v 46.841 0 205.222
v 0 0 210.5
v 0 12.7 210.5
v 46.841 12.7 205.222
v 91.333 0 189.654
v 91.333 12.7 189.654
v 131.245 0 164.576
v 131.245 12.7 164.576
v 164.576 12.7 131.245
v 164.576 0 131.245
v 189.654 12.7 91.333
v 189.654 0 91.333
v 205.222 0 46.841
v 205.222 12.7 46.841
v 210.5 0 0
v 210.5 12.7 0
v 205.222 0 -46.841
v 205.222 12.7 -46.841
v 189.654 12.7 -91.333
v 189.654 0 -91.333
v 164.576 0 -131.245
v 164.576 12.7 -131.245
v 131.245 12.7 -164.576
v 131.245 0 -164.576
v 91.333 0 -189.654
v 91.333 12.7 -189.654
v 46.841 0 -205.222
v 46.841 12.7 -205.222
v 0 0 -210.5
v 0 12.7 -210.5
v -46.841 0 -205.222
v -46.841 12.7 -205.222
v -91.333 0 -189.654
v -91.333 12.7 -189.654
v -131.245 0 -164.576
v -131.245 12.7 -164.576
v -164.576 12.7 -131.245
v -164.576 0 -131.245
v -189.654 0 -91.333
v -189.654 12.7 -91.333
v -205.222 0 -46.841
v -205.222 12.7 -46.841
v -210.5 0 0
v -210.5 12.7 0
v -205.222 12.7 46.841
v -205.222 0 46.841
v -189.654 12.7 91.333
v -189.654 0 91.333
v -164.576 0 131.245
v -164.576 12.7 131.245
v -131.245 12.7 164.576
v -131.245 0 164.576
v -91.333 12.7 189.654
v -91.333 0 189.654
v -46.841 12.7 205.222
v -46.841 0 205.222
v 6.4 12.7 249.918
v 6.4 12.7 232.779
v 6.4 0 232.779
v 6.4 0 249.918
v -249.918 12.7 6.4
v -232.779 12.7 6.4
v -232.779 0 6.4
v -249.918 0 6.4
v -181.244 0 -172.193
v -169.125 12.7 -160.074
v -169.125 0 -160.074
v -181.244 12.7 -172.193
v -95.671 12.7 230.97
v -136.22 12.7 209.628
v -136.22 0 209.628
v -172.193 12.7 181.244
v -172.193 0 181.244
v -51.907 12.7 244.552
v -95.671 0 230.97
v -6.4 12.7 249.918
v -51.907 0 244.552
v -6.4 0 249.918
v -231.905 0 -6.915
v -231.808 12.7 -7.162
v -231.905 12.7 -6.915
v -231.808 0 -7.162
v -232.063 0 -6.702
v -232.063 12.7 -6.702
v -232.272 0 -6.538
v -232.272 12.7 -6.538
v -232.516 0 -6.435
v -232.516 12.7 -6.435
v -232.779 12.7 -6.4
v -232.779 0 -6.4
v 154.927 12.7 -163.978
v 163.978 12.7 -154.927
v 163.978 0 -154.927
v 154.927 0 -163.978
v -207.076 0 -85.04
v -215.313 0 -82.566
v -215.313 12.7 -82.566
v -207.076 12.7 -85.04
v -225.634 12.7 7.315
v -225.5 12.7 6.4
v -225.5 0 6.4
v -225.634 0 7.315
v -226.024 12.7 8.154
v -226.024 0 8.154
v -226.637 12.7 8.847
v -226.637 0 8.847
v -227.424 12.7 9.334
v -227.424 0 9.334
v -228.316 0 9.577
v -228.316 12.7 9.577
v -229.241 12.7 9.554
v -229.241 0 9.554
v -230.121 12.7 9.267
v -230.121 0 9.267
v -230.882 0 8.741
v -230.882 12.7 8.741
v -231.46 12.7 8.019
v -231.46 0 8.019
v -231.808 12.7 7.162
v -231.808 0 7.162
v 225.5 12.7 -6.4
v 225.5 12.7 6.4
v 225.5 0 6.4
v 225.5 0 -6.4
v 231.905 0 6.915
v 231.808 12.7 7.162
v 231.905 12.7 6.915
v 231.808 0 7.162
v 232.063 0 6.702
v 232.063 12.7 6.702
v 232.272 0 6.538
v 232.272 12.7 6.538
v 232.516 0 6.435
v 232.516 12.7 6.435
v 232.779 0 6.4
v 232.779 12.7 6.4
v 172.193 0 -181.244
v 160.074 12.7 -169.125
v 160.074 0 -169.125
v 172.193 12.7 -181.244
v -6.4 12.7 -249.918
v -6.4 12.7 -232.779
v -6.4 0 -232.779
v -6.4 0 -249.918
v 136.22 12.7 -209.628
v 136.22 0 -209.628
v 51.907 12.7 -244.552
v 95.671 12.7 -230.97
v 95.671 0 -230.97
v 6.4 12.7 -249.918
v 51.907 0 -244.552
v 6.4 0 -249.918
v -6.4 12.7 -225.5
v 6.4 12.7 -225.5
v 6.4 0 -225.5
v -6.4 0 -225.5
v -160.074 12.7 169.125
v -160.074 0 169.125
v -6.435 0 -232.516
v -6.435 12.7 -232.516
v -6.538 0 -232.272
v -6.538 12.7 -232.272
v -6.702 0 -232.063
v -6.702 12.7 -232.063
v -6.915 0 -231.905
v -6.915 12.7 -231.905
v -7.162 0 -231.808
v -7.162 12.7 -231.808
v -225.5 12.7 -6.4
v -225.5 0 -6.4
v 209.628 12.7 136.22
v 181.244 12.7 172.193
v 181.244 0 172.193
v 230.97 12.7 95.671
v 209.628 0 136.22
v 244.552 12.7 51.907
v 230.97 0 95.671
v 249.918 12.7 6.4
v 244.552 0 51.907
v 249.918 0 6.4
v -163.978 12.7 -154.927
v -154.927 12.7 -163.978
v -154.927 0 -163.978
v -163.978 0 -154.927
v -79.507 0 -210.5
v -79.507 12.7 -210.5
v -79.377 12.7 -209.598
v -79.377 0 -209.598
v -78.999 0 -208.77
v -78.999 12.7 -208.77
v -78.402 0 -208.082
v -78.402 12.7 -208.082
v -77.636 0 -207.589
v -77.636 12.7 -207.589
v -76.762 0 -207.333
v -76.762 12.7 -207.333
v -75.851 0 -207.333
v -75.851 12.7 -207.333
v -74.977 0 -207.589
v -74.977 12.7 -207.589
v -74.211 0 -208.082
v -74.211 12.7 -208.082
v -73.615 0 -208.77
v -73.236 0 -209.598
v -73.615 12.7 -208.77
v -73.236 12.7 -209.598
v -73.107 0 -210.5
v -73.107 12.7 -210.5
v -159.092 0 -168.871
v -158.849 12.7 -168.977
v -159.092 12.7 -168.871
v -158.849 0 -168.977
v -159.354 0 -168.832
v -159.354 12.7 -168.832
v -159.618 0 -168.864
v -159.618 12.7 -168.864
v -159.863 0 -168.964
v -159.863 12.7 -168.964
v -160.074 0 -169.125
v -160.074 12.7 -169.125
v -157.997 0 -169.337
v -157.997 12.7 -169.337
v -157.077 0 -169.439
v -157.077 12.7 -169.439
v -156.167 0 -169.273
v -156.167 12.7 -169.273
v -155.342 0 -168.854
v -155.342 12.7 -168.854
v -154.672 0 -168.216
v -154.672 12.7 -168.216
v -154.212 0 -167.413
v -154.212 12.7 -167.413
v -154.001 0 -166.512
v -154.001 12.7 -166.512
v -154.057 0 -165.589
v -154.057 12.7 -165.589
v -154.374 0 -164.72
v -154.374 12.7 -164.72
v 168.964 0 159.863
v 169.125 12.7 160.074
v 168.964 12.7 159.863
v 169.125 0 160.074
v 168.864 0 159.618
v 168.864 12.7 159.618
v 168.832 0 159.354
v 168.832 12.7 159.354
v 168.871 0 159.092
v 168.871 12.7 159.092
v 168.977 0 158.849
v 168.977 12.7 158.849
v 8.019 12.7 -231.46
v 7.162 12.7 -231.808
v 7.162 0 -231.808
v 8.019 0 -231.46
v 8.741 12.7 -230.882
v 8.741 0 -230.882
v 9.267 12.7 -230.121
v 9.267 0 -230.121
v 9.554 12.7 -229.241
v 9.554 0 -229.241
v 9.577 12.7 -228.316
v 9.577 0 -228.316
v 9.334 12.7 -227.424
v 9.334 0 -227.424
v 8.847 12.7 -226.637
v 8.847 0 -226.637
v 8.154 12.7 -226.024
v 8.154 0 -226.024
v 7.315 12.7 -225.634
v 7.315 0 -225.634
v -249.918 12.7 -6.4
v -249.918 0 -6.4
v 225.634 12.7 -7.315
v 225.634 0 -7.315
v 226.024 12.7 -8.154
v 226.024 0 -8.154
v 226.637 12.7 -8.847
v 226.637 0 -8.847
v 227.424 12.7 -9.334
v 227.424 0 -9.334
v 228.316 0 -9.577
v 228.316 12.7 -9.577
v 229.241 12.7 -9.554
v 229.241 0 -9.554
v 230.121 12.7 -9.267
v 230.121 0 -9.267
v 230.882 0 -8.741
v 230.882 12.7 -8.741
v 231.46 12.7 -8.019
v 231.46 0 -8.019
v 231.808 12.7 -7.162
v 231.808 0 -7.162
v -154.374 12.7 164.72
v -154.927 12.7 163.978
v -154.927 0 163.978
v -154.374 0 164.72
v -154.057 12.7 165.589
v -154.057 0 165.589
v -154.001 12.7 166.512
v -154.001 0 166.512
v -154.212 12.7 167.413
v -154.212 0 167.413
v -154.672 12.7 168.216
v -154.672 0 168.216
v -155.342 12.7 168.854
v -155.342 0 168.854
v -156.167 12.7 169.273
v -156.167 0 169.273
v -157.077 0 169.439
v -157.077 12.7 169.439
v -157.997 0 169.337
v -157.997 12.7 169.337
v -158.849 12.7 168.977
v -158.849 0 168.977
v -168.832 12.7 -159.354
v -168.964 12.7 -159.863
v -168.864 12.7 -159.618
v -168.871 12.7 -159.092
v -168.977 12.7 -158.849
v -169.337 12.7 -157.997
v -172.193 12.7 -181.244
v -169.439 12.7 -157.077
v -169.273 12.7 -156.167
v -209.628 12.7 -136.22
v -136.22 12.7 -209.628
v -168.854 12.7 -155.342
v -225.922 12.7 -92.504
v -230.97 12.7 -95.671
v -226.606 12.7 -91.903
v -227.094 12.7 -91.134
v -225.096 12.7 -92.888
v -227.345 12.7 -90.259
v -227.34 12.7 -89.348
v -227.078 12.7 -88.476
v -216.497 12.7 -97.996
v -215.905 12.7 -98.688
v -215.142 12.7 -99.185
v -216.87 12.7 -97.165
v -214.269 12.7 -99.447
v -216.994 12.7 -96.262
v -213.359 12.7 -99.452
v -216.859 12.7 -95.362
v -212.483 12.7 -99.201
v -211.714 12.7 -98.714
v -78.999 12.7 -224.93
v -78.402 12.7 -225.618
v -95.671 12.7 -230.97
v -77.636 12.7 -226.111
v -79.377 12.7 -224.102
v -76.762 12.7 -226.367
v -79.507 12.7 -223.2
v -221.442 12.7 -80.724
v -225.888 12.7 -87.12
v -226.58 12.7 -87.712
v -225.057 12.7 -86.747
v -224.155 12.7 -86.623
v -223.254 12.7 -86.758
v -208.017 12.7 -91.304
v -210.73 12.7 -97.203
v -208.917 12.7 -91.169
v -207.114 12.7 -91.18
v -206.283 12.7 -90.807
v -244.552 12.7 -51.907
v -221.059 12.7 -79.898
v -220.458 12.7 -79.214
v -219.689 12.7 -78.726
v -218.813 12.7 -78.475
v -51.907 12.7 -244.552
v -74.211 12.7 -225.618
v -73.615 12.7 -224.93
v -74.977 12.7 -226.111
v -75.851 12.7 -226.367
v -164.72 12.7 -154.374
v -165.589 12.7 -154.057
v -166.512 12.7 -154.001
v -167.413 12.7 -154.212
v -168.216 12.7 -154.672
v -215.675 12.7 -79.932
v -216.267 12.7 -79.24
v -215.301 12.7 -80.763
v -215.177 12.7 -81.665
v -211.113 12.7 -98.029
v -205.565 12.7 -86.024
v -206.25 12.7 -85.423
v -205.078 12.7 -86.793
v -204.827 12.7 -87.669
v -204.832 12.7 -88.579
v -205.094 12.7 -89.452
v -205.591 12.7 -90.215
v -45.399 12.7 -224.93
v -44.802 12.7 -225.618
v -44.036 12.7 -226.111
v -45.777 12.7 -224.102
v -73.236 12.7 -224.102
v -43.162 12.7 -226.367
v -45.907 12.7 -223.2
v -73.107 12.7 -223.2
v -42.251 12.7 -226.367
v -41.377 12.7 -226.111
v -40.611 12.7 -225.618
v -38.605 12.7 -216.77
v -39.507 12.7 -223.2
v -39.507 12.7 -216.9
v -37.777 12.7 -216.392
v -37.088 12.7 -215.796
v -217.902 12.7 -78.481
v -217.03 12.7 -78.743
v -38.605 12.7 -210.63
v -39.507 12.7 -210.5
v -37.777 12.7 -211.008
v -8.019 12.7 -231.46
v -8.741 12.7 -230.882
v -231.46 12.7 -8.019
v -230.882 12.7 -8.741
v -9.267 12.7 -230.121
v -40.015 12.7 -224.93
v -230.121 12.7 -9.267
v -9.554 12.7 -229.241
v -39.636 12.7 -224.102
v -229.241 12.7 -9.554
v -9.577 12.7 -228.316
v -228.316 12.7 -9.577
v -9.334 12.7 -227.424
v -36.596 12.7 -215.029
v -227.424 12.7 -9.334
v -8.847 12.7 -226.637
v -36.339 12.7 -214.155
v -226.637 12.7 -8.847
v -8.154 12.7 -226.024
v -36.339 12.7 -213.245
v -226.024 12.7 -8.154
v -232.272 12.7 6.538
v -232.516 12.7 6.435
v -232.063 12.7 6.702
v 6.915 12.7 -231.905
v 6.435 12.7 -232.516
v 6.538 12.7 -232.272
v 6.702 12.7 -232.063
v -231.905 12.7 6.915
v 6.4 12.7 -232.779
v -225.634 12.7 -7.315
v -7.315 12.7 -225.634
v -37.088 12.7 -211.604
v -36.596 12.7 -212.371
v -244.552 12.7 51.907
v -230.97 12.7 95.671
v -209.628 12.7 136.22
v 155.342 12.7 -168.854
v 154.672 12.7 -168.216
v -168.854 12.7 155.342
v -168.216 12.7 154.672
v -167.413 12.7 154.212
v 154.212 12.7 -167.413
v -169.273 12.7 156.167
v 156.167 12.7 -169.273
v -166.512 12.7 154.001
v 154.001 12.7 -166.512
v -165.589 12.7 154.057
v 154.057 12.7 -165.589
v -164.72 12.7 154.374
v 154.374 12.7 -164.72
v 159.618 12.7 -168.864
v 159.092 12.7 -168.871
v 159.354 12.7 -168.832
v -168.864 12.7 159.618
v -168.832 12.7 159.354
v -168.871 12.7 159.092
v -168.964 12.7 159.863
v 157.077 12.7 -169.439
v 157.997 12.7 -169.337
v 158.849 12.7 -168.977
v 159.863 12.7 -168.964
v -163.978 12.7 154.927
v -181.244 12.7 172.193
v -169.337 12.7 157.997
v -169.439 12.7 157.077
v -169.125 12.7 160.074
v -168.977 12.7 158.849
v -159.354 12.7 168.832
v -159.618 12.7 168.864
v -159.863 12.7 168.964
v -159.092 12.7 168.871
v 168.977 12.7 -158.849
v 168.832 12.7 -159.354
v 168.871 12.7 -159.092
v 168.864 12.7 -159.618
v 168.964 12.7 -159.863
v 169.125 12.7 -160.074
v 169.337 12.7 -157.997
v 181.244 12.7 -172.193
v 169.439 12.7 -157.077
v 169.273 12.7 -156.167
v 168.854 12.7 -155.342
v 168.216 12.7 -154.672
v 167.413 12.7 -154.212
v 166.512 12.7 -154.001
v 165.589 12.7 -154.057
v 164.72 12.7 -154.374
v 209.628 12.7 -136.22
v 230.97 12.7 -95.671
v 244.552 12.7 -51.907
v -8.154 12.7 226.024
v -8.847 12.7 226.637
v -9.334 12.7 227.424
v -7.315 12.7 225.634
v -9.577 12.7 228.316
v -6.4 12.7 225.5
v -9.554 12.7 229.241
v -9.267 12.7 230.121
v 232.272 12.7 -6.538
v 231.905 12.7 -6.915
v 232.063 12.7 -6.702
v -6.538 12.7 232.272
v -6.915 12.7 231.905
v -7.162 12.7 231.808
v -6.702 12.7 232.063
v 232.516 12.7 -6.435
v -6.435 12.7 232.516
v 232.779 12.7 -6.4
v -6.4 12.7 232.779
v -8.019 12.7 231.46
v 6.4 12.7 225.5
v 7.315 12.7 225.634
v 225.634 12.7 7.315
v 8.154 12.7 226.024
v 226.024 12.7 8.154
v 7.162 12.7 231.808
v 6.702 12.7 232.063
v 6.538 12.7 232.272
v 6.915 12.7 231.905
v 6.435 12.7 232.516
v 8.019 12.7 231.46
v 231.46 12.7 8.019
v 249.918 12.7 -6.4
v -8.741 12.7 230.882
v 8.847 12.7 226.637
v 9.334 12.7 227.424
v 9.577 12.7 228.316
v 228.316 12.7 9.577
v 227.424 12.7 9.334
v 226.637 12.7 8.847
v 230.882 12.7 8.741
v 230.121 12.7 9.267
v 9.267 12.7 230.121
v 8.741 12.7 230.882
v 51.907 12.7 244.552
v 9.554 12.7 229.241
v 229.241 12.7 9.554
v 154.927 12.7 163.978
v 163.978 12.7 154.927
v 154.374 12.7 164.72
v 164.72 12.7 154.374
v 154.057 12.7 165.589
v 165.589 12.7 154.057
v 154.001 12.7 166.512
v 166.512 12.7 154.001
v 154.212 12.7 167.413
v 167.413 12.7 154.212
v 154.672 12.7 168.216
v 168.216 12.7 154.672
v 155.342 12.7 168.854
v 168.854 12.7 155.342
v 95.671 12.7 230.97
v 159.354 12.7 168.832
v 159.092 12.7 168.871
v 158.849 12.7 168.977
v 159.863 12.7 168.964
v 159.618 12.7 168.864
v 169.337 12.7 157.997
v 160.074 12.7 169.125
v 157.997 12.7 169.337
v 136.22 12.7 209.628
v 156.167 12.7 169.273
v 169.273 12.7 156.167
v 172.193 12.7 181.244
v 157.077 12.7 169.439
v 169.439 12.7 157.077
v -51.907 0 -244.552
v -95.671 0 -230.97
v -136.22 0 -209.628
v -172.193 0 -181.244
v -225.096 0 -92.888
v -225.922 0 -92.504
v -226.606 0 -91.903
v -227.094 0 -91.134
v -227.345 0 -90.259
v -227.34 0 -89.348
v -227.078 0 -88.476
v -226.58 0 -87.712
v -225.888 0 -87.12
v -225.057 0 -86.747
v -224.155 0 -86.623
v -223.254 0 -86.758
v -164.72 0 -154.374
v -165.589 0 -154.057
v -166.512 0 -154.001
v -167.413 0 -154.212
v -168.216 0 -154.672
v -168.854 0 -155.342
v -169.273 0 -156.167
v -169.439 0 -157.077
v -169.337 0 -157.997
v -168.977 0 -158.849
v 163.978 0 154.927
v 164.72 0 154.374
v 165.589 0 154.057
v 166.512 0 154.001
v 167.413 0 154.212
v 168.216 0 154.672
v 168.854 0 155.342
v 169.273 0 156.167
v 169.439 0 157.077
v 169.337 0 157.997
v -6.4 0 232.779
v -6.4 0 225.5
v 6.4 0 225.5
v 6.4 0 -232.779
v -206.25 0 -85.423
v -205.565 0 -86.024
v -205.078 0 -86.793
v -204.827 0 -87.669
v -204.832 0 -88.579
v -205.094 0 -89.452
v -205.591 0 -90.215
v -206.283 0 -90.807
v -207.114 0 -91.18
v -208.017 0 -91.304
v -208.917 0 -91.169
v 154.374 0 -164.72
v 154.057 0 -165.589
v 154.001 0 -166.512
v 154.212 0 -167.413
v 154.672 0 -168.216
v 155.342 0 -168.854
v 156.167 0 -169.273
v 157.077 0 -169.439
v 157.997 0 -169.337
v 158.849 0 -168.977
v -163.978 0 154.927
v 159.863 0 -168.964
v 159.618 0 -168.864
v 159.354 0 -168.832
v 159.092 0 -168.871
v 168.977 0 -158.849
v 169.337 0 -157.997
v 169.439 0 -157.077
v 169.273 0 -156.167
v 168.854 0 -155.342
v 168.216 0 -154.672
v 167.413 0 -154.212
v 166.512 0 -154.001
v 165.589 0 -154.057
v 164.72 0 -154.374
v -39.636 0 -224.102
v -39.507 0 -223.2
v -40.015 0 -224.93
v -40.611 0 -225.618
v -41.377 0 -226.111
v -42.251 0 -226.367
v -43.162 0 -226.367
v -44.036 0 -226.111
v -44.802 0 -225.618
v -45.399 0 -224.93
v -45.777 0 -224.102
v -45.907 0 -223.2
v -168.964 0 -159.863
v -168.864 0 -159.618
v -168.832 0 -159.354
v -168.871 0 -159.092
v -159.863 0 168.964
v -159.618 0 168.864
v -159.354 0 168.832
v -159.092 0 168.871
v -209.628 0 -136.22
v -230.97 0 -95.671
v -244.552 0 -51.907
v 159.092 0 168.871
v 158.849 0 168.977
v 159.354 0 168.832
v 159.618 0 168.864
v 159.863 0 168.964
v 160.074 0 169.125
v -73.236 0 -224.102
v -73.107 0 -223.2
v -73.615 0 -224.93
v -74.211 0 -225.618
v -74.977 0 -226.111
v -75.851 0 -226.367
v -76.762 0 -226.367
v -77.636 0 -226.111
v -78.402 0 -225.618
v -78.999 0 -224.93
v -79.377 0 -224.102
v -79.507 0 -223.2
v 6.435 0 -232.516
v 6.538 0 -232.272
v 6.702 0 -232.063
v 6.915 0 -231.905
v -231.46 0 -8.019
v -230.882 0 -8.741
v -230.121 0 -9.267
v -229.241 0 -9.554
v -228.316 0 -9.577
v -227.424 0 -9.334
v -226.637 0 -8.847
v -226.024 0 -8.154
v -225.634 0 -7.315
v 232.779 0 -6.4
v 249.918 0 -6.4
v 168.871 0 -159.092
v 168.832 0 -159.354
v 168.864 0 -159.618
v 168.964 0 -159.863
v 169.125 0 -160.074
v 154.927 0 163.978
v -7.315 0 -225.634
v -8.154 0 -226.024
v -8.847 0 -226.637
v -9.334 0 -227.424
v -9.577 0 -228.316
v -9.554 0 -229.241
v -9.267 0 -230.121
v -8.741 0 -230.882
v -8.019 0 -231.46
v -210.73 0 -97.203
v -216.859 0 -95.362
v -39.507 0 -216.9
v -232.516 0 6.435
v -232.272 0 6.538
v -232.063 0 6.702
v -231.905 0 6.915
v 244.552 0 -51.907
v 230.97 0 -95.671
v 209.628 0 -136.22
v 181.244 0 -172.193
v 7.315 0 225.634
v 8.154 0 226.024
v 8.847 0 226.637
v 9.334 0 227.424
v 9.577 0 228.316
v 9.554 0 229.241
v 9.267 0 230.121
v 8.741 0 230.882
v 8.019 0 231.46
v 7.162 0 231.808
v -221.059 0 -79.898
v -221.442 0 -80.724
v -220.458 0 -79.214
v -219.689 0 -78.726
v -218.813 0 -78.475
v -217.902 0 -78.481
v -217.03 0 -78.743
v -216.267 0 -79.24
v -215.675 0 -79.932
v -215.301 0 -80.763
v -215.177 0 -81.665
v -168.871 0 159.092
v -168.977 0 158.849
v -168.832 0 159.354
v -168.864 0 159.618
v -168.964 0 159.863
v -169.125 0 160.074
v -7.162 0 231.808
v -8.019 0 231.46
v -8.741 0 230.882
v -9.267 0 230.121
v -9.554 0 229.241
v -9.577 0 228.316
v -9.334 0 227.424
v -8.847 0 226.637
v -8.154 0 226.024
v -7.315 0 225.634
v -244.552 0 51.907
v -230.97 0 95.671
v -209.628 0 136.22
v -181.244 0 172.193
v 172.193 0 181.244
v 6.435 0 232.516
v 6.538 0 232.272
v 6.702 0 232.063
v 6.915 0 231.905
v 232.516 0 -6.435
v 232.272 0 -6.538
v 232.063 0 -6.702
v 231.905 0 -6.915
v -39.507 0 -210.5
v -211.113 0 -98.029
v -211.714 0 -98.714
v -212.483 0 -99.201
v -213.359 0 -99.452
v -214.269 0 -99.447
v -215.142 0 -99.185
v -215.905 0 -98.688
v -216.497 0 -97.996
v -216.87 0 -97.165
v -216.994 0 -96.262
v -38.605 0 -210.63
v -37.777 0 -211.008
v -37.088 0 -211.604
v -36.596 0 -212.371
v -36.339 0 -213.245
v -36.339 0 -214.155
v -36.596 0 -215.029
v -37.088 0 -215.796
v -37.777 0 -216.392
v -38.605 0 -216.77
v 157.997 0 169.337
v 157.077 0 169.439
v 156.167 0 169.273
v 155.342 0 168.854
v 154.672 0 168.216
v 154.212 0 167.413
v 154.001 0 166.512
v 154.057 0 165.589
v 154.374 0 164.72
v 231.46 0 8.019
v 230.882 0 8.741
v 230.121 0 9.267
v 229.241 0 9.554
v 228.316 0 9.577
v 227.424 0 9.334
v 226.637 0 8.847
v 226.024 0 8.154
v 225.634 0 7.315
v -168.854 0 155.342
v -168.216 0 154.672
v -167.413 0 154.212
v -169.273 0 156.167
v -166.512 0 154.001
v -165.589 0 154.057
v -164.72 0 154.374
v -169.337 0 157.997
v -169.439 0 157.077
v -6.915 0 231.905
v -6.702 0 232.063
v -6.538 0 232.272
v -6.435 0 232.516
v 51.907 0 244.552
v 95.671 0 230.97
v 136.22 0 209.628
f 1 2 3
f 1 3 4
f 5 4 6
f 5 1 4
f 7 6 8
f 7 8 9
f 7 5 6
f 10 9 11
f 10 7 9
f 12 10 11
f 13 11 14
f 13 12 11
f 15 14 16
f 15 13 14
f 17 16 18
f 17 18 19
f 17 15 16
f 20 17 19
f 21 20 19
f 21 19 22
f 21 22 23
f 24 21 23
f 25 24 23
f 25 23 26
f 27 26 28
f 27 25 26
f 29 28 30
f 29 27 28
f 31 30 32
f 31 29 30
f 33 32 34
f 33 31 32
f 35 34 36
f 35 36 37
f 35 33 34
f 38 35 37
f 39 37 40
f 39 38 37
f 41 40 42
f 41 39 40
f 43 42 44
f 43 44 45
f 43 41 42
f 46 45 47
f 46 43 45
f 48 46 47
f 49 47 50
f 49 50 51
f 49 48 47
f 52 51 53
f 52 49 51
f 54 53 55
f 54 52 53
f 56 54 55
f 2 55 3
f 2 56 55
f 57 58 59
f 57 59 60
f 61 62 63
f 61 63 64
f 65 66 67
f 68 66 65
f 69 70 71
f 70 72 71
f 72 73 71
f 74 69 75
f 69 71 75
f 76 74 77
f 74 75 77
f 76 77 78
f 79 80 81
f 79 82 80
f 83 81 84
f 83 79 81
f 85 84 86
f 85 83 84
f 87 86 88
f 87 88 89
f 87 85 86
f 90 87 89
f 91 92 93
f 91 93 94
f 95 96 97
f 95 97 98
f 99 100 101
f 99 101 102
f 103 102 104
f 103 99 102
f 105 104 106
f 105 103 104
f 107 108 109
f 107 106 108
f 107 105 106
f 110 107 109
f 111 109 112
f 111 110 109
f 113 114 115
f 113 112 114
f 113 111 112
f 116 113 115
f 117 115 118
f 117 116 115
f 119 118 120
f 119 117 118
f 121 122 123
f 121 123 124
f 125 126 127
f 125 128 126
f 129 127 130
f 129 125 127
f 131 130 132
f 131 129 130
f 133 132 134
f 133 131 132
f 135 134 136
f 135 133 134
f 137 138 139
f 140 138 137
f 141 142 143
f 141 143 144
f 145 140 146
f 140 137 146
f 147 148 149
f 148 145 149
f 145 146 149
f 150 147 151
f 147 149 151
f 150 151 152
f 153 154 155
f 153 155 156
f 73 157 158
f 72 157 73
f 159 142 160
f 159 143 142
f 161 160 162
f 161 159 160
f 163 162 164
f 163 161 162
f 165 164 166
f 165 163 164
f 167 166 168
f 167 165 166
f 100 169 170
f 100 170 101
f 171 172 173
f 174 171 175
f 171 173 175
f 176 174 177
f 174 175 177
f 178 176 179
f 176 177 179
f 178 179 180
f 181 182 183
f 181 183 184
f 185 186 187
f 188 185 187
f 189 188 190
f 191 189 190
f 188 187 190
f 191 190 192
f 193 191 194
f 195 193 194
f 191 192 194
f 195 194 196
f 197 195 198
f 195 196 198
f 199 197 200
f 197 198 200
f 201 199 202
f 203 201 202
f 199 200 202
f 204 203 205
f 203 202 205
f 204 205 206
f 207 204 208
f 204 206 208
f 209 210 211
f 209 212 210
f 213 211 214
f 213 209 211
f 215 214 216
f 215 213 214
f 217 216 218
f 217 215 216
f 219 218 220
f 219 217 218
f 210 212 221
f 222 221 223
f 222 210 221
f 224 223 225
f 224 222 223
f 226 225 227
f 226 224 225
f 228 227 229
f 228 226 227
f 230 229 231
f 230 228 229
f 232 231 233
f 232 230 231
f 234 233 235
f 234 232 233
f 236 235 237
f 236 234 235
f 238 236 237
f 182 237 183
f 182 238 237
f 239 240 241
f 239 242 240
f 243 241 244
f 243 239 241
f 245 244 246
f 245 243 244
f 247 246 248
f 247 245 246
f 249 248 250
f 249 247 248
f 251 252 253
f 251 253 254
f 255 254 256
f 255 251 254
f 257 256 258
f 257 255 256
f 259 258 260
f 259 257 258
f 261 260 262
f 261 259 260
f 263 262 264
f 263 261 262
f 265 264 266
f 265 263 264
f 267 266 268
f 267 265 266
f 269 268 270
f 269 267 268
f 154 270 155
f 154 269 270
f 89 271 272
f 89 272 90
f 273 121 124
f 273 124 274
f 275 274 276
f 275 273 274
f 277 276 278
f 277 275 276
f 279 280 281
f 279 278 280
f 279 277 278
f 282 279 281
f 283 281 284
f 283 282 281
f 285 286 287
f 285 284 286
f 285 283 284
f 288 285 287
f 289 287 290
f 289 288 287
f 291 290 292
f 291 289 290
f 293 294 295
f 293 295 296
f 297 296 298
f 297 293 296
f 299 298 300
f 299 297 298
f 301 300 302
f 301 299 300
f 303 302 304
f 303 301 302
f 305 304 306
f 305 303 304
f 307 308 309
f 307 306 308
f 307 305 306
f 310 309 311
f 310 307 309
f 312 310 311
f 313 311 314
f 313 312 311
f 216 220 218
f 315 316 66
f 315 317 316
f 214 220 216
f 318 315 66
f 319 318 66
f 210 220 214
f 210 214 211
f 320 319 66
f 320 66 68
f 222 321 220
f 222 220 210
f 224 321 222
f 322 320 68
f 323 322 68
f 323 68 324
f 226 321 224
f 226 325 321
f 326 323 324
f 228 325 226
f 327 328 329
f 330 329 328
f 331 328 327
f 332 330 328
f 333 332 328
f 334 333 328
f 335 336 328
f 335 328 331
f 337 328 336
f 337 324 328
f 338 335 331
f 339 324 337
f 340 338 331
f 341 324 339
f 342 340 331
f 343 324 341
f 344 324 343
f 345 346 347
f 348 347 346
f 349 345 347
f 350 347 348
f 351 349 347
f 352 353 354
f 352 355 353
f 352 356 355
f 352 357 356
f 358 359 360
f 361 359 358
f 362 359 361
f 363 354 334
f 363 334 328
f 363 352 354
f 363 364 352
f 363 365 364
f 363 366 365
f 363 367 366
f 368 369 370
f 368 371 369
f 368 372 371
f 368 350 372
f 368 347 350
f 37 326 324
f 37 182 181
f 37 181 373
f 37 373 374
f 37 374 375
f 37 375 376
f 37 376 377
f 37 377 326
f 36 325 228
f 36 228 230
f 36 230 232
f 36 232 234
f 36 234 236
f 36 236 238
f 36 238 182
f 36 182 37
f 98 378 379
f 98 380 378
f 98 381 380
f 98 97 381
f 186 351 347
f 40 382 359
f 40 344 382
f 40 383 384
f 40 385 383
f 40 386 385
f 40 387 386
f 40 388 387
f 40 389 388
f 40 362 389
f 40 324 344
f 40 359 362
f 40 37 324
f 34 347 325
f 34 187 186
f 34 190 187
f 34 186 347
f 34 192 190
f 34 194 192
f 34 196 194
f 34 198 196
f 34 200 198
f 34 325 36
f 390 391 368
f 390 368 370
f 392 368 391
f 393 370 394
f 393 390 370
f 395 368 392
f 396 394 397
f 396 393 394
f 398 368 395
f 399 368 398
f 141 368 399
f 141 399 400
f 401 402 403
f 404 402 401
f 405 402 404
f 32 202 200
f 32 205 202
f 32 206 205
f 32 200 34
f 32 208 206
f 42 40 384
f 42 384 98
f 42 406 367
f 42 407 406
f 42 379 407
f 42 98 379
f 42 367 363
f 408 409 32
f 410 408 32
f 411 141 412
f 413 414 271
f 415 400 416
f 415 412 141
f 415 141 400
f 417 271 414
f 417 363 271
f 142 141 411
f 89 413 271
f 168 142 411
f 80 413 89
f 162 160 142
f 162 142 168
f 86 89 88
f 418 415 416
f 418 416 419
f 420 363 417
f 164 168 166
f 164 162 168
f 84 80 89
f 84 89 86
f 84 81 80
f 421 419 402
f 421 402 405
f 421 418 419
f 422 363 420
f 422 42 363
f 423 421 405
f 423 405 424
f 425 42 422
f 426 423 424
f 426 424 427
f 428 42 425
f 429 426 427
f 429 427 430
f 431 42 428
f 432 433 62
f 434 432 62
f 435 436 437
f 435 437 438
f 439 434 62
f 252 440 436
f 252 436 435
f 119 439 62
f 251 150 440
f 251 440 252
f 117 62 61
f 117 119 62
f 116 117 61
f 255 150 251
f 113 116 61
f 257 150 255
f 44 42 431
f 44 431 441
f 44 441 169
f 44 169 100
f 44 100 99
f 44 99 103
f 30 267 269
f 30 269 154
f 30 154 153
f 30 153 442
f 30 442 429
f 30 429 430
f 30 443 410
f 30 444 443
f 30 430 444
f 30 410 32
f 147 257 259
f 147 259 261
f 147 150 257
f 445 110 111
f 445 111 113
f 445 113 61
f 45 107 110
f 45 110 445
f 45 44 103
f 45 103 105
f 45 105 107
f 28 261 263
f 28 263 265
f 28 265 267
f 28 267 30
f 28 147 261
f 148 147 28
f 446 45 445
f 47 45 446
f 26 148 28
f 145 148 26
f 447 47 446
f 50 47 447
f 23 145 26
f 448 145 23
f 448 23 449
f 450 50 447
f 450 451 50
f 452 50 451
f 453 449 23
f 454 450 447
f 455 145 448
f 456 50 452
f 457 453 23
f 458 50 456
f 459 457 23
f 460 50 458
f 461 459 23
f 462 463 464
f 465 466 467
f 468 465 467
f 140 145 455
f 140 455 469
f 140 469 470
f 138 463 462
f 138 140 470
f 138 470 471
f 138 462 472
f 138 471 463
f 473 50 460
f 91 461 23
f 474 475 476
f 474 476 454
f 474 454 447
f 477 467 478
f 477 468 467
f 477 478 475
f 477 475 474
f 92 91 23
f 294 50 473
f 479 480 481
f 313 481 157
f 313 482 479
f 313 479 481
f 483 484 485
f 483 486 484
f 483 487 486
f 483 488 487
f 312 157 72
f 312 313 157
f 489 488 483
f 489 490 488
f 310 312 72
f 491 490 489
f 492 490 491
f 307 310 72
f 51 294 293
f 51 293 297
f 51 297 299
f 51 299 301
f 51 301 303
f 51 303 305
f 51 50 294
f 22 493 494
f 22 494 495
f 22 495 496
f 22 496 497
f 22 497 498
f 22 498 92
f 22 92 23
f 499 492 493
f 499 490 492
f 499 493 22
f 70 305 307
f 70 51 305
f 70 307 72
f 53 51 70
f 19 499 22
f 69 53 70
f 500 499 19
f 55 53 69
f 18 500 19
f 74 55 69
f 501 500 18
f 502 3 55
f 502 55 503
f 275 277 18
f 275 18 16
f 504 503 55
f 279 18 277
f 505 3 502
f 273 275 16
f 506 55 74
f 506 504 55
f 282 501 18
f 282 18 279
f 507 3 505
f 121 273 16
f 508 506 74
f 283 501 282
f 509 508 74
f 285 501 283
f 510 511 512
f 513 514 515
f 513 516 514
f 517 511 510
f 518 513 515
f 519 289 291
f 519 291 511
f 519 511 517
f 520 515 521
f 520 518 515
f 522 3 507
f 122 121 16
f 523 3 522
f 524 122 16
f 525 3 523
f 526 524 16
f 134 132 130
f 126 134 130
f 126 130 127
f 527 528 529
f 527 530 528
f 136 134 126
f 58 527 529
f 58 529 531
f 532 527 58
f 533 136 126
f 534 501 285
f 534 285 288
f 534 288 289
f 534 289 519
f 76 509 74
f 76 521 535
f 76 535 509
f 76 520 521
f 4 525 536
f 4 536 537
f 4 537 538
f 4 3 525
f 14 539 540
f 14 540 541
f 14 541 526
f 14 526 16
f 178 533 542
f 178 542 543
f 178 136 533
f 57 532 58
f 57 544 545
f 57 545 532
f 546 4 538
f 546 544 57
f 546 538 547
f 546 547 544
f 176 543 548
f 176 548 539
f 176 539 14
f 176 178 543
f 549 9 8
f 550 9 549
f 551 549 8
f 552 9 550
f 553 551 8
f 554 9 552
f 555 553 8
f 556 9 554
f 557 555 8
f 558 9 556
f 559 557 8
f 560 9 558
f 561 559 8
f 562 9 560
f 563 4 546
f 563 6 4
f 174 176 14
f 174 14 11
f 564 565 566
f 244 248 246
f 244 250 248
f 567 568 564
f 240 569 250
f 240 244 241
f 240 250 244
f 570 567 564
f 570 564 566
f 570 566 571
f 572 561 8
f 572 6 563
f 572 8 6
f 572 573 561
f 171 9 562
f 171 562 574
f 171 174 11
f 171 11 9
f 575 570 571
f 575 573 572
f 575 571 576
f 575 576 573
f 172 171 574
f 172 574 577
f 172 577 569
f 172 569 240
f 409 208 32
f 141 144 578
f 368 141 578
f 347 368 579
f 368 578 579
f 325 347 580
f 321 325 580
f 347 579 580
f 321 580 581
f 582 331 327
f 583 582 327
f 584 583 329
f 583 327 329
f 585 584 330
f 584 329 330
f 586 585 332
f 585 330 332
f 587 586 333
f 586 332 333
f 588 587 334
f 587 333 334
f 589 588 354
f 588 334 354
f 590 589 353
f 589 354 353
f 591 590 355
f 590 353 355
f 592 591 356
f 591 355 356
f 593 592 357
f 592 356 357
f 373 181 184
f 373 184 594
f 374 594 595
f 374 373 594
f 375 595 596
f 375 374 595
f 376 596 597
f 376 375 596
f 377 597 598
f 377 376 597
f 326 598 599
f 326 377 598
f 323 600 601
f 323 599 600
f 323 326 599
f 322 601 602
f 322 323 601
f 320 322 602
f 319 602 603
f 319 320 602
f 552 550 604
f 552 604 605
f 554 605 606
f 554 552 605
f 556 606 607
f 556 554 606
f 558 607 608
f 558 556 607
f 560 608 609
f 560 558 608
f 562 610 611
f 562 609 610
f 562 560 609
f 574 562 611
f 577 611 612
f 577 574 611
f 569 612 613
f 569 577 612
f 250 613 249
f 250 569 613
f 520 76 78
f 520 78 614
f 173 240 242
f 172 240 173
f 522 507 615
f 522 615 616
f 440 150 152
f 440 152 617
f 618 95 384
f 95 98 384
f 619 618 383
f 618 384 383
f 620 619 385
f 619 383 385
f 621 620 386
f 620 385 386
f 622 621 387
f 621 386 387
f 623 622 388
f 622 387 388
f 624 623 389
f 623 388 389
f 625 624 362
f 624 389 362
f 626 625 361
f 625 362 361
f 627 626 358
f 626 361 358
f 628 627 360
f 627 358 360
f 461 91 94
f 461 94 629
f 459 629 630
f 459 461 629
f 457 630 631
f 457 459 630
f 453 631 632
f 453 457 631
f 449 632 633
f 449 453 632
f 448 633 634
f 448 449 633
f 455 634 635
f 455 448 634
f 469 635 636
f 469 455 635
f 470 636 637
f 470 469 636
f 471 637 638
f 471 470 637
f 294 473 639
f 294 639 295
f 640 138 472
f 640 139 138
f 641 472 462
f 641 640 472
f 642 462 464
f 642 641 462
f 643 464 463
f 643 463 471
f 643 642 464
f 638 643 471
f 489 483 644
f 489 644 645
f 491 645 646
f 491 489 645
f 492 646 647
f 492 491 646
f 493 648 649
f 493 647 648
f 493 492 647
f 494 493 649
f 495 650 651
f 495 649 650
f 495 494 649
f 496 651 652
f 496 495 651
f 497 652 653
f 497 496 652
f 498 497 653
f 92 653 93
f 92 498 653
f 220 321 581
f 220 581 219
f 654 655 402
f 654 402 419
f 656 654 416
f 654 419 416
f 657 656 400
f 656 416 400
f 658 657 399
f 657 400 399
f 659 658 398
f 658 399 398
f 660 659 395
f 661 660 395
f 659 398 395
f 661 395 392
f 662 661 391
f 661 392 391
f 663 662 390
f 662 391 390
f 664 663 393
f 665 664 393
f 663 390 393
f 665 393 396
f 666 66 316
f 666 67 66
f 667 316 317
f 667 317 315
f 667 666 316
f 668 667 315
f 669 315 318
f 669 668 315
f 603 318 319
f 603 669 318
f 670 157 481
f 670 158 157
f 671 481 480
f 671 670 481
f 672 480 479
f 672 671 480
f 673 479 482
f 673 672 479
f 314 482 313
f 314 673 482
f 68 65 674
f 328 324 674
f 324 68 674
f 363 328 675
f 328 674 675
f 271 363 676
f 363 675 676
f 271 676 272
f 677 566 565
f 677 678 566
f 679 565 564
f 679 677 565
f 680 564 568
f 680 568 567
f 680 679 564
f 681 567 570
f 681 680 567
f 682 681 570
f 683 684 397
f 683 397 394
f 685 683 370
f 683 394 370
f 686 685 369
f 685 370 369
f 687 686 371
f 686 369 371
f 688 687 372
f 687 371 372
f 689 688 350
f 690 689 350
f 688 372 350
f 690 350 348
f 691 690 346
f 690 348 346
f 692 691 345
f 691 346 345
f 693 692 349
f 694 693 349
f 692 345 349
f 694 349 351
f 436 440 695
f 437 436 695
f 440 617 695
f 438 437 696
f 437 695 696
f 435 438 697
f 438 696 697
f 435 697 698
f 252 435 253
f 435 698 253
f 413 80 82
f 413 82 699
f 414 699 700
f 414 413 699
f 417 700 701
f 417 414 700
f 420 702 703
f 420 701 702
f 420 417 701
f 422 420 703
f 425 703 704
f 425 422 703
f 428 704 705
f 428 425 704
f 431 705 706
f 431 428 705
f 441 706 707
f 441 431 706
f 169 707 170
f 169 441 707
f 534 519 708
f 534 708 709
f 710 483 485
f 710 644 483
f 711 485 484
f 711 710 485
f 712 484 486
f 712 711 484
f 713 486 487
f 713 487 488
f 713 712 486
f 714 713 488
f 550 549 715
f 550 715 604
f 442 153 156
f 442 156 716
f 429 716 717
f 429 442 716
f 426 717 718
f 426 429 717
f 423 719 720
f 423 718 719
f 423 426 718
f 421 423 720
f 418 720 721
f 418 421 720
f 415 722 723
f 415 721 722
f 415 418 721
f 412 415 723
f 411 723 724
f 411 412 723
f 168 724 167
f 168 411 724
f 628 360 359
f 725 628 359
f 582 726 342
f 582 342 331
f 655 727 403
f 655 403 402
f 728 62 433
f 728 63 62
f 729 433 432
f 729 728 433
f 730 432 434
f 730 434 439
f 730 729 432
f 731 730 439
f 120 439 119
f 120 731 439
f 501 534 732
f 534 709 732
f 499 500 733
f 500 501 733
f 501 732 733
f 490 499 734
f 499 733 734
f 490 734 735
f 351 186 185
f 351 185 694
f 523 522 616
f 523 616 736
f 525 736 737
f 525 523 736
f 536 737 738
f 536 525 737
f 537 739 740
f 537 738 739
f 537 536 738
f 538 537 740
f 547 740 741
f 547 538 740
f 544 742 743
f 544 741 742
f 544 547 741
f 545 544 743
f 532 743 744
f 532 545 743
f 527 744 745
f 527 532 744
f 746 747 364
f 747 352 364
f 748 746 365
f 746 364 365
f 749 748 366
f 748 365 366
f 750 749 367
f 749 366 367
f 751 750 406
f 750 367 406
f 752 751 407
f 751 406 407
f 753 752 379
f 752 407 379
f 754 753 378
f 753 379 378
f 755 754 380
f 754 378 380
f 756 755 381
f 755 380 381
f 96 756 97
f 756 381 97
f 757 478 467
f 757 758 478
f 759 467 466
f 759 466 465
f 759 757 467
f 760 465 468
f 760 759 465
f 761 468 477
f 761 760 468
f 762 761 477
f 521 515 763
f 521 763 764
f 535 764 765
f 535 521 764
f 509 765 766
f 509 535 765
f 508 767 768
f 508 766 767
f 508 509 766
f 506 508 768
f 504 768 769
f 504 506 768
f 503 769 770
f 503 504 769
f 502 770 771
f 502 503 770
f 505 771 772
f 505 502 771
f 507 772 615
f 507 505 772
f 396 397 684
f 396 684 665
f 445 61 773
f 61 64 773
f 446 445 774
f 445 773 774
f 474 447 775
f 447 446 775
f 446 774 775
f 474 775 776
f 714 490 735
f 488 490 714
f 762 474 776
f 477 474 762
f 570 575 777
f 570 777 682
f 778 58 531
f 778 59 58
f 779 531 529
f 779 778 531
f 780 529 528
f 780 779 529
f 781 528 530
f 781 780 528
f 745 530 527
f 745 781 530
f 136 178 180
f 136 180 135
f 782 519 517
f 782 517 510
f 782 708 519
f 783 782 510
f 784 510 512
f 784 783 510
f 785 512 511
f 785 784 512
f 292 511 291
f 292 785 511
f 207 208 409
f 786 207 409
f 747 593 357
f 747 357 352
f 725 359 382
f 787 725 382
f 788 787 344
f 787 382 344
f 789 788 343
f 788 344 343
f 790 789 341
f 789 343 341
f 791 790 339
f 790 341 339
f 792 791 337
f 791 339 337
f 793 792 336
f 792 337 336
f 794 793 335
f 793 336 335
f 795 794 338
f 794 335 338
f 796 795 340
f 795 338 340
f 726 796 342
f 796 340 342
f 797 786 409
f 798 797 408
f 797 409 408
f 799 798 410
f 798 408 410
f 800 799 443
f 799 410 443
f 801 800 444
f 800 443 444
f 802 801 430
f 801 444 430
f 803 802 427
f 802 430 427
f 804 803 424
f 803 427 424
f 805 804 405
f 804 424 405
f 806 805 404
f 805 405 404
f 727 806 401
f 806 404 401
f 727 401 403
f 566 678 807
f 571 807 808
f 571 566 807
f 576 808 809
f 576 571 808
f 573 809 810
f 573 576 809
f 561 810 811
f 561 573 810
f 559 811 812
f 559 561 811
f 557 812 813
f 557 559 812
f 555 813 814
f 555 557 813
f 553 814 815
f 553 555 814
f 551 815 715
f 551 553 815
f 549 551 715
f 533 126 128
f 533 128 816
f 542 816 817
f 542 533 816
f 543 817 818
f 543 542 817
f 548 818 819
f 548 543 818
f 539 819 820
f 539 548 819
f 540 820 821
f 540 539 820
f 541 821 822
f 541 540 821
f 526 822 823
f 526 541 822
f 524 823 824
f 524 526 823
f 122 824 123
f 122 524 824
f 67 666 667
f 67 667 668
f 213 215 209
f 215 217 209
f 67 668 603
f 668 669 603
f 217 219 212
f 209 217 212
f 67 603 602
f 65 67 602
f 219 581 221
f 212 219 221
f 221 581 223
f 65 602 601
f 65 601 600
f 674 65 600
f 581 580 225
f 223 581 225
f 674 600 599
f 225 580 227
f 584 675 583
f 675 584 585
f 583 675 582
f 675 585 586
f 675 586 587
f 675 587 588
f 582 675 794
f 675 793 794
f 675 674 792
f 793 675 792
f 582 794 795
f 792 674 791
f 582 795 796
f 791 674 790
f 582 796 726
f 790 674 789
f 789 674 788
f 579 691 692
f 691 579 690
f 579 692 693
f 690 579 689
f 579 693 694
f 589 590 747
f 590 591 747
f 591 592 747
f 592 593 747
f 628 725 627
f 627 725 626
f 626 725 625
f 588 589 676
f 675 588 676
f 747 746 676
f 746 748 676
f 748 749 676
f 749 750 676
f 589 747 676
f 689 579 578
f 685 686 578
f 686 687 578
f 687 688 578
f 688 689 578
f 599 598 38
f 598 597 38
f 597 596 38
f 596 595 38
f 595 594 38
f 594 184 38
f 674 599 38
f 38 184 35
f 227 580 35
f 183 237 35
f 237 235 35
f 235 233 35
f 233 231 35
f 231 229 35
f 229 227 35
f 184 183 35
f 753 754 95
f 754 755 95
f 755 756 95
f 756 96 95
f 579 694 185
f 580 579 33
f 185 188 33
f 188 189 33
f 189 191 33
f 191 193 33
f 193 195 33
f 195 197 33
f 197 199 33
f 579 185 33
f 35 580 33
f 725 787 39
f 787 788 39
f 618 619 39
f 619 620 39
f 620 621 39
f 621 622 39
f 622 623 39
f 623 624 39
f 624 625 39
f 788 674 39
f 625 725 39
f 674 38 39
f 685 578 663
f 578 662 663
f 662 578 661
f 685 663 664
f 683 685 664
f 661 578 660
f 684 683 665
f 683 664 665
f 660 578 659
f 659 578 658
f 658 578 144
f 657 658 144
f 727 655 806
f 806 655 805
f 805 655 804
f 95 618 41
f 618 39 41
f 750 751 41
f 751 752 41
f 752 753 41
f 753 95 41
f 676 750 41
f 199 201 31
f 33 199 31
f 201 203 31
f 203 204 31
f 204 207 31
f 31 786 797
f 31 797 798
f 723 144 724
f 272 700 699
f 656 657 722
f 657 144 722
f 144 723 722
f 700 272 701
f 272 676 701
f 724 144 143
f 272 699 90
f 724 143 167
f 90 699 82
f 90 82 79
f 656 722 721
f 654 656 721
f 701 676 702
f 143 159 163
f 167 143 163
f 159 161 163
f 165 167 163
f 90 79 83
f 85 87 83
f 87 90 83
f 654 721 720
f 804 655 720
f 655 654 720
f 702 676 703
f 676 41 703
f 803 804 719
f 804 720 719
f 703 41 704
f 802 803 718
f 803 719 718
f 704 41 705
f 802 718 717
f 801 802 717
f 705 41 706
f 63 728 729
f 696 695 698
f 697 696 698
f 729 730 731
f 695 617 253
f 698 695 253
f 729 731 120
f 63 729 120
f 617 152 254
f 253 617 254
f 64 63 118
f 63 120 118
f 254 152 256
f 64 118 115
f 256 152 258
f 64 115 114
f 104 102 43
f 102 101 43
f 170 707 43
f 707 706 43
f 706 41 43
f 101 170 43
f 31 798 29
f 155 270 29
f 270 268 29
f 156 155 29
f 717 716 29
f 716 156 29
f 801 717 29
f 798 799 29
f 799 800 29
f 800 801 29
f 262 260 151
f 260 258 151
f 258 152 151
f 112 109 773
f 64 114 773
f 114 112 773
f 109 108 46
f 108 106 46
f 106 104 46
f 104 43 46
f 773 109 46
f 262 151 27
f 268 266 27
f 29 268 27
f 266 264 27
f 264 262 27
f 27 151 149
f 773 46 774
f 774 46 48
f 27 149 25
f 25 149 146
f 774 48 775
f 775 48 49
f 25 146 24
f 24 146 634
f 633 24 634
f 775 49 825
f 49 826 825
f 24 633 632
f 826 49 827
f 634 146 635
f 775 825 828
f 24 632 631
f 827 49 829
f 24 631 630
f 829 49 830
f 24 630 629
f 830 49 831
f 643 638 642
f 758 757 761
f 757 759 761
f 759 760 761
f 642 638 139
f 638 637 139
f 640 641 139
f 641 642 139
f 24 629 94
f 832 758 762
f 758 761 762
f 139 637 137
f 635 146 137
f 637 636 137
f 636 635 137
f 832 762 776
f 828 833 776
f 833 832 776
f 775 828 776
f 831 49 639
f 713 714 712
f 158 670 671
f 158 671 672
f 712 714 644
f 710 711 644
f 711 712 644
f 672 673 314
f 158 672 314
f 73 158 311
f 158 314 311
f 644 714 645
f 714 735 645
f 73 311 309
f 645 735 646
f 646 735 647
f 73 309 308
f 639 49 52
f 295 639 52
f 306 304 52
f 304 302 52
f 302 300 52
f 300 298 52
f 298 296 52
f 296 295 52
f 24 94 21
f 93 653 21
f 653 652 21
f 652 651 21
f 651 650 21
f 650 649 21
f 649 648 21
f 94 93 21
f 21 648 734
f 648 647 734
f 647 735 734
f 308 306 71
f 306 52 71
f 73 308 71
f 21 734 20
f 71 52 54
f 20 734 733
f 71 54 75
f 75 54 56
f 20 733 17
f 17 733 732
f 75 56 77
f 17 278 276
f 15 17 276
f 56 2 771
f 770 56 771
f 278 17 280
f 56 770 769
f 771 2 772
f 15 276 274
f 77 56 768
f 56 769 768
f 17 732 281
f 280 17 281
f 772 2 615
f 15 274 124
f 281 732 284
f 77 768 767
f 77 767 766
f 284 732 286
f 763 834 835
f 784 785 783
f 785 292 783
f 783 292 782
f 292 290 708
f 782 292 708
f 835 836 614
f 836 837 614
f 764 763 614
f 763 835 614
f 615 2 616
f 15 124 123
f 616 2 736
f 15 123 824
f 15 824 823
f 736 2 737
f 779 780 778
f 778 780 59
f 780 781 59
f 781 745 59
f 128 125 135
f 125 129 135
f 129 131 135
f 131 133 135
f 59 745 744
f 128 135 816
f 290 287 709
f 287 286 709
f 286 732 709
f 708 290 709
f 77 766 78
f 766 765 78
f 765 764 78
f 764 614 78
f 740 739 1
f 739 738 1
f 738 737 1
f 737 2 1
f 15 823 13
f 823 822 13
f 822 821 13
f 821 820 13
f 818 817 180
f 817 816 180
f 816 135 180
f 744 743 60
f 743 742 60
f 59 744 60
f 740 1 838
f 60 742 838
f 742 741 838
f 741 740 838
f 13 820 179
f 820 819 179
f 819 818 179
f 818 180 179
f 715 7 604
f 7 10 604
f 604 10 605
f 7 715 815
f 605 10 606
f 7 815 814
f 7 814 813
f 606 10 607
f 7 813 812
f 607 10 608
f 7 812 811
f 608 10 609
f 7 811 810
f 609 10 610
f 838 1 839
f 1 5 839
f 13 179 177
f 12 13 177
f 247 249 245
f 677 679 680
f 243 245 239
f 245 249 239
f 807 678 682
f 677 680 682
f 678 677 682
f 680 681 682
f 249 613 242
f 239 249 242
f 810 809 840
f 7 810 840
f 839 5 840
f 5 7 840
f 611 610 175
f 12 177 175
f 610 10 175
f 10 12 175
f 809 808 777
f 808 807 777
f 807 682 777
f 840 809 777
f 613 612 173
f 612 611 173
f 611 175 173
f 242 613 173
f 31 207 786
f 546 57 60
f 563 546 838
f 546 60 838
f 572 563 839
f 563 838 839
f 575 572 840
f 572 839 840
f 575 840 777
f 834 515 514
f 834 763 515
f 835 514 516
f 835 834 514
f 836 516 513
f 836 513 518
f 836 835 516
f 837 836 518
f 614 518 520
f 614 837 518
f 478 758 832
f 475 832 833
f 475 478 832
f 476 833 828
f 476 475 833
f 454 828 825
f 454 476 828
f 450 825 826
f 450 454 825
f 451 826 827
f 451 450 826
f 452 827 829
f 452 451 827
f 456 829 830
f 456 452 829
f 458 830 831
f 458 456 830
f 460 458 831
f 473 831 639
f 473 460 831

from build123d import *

# Parameters (mm, degrees)
SKETCH1_R                = 250
SKETCH1_R_2              = 210.5
BOSS_EXTRUDE1_DEPTH      = 12.7
CUT_EXTRUDE1_DEPTH       = 354.781415566
FILLET1_R                = 1
CIRPATTERN1_COUNT        = 8
FILLET1_OF_CIRPATTERN1_R = 1
SKETCH6_W                = 40
SKETCH6_H                = 12.7
CUT_EXTRUDE4_DEPTH       = 354.665618911
SKETCH7_R                = 3.2
CUT_EXTRUDE5_DEPTH       = 354.665618911


with BuildPart() as part:
    # Sketch1 → Boss-Extrude1 (new body)
    with BuildSketch(Plane(origin=(0, 0, 0), x_dir=(1, 0, 0), z_dir=(0, 1, 0))):
        with Locations(Location((0, 0, 0), (0, 0, 270))):
            Circle(SKETCH1_R)
        with Locations(Location((0, 0, 0), (0, 0, 270))):
            Circle(SKETCH1_R_2, mode=Mode.SUBTRACT)
    extrude(amount=BOSS_EXTRUDE1_DEPTH)

    # Sketch2 → Cut-Extrude1 (cut, through all)
    with BuildSketch(Plane(origin=(0, 12.7, 0), x_dir=(1, 0, 0), z_dir=(0, 1, 0))):
        with BuildLine():
            Line((6.4, 225.5), (-6.4, 225.5))
            ThreePointArc((-6.4, 225.5), (-9.6, 228.7), (-6.4, 231.9))
            Line((-6.4, 231.9), (-6.4, 250))
            Line((-6.4, 250), (6.4, 250))
            Line((6.4, 250), (6.4, 231.9))
            ThreePointArc((6.4, 231.9), (9.6, 228.7), (6.4, 225.5))
        make_face()
    cut_extrude1 = extrude(amount=-CUT_EXTRUDE1_DEPTH, mode=Mode.SUBTRACT)

    # Fillet1
    fillet1_edges = [part.edges().sort_by_distance(p)[0] for p in [
        (-6.4, 6.35, -231.9),
        (6.4, 6.35, -231.9),
    ]]
    fillet(fillet1_edges, radius=FILLET1_R)

    # CirPattern1: Cut-Extrude1 ×8 about axis
    cirpattern1_axis = Axis((0, 0, 0), (0, 1, 0))
    for i in range(1, CIRPATTERN1_COUNT):
        add(cut_extrude1.rotate(cirpattern1_axis, i * 360 / CIRPATTERN1_COUNT), mode=Mode.SUBTRACT)

    # Fillet1 of CirPattern1
    fillet1_of_cirpattern1_edges = [part.edges().sort_by_distance(p)[0] for p in [
        (-168.503545957, 6.35, -159.452579158),
        (-159.452579158, 6.35, -168.503545957),
        (-231.9, 6.35, 6.4),
        (-231.9, 6.35, -6.4),
        (-159.452579158, 6.35, 168.503545957),
        (-168.503545957, 6.35, 159.452579158),
        (6.4, 6.35, 231.9),
        (-6.4, 6.35, 231.9),
        (168.503545957, 6.35, 159.452579158),
        (159.452579158, 6.35, 168.503545957),
        (231.9, 6.35, -6.4),
        (231.9, 6.35, 6.4),
        (159.452579158, 6.35, -168.503545957),
        (168.503545957, 6.35, -159.452579158),
    ]]
    fillet(fillet1_of_cirpattern1_edges, radius=FILLET1_OF_CIRPATTERN1_R)

    # Sketch6 → Cut-Extrude4 (cut, through all)
    with BuildSketch(Plane(origin=(0, 12.7, 0), x_dir=(1, 0, 0), z_dir=(0, 1, 0))):
        with Locations((-59.506660352, 216.85)):
            Rectangle(SKETCH6_W, SKETCH6_H)
        Polygon((-225.095552296, 92.887646728), (-221.442085646, 80.724498227), (-207.076162221, 85.039616318), (-210.72962887, 97.202764818), align=None)
    extrude(amount=-CUT_EXTRUDE4_DEPTH, mode=Mode.SUBTRACT)

    # Sketch7 → Cut-Extrude5 (cut, through all)
    with BuildSketch(Plane(origin=(0, 12.7, 0), x_dir=(1, 0, 0), z_dir=(0, 1, 0))):
        with Locations((-224.17499377, 89.822916397)):
            Circle(SKETCH7_R)
        with Locations((-218.377355315, 81.645056753)):
            Circle(SKETCH7_R)
        with Locations((-207.996720747, 88.104346648)):
            Circle(SKETCH7_R)
        with Locations((-213.794359201, 96.282206292)):
            Circle(SKETCH7_R)
        with Locations((-76.306660352, 223.2)):
            Circle(SKETCH7_R)
        with Locations((-42.706660352, 223.2)):
            Circle(SKETCH7_R)
        with Locations((-39.506660352, 213.7)):
            Circle(SKETCH7_R)
        with Locations((-76.306660352, 210.5)):
            Circle(SKETCH7_R)
    extrude(amount=-CUT_EXTRUDE5_DEPTH, mode=Mode.SUBTRACT)


solid = part.part
